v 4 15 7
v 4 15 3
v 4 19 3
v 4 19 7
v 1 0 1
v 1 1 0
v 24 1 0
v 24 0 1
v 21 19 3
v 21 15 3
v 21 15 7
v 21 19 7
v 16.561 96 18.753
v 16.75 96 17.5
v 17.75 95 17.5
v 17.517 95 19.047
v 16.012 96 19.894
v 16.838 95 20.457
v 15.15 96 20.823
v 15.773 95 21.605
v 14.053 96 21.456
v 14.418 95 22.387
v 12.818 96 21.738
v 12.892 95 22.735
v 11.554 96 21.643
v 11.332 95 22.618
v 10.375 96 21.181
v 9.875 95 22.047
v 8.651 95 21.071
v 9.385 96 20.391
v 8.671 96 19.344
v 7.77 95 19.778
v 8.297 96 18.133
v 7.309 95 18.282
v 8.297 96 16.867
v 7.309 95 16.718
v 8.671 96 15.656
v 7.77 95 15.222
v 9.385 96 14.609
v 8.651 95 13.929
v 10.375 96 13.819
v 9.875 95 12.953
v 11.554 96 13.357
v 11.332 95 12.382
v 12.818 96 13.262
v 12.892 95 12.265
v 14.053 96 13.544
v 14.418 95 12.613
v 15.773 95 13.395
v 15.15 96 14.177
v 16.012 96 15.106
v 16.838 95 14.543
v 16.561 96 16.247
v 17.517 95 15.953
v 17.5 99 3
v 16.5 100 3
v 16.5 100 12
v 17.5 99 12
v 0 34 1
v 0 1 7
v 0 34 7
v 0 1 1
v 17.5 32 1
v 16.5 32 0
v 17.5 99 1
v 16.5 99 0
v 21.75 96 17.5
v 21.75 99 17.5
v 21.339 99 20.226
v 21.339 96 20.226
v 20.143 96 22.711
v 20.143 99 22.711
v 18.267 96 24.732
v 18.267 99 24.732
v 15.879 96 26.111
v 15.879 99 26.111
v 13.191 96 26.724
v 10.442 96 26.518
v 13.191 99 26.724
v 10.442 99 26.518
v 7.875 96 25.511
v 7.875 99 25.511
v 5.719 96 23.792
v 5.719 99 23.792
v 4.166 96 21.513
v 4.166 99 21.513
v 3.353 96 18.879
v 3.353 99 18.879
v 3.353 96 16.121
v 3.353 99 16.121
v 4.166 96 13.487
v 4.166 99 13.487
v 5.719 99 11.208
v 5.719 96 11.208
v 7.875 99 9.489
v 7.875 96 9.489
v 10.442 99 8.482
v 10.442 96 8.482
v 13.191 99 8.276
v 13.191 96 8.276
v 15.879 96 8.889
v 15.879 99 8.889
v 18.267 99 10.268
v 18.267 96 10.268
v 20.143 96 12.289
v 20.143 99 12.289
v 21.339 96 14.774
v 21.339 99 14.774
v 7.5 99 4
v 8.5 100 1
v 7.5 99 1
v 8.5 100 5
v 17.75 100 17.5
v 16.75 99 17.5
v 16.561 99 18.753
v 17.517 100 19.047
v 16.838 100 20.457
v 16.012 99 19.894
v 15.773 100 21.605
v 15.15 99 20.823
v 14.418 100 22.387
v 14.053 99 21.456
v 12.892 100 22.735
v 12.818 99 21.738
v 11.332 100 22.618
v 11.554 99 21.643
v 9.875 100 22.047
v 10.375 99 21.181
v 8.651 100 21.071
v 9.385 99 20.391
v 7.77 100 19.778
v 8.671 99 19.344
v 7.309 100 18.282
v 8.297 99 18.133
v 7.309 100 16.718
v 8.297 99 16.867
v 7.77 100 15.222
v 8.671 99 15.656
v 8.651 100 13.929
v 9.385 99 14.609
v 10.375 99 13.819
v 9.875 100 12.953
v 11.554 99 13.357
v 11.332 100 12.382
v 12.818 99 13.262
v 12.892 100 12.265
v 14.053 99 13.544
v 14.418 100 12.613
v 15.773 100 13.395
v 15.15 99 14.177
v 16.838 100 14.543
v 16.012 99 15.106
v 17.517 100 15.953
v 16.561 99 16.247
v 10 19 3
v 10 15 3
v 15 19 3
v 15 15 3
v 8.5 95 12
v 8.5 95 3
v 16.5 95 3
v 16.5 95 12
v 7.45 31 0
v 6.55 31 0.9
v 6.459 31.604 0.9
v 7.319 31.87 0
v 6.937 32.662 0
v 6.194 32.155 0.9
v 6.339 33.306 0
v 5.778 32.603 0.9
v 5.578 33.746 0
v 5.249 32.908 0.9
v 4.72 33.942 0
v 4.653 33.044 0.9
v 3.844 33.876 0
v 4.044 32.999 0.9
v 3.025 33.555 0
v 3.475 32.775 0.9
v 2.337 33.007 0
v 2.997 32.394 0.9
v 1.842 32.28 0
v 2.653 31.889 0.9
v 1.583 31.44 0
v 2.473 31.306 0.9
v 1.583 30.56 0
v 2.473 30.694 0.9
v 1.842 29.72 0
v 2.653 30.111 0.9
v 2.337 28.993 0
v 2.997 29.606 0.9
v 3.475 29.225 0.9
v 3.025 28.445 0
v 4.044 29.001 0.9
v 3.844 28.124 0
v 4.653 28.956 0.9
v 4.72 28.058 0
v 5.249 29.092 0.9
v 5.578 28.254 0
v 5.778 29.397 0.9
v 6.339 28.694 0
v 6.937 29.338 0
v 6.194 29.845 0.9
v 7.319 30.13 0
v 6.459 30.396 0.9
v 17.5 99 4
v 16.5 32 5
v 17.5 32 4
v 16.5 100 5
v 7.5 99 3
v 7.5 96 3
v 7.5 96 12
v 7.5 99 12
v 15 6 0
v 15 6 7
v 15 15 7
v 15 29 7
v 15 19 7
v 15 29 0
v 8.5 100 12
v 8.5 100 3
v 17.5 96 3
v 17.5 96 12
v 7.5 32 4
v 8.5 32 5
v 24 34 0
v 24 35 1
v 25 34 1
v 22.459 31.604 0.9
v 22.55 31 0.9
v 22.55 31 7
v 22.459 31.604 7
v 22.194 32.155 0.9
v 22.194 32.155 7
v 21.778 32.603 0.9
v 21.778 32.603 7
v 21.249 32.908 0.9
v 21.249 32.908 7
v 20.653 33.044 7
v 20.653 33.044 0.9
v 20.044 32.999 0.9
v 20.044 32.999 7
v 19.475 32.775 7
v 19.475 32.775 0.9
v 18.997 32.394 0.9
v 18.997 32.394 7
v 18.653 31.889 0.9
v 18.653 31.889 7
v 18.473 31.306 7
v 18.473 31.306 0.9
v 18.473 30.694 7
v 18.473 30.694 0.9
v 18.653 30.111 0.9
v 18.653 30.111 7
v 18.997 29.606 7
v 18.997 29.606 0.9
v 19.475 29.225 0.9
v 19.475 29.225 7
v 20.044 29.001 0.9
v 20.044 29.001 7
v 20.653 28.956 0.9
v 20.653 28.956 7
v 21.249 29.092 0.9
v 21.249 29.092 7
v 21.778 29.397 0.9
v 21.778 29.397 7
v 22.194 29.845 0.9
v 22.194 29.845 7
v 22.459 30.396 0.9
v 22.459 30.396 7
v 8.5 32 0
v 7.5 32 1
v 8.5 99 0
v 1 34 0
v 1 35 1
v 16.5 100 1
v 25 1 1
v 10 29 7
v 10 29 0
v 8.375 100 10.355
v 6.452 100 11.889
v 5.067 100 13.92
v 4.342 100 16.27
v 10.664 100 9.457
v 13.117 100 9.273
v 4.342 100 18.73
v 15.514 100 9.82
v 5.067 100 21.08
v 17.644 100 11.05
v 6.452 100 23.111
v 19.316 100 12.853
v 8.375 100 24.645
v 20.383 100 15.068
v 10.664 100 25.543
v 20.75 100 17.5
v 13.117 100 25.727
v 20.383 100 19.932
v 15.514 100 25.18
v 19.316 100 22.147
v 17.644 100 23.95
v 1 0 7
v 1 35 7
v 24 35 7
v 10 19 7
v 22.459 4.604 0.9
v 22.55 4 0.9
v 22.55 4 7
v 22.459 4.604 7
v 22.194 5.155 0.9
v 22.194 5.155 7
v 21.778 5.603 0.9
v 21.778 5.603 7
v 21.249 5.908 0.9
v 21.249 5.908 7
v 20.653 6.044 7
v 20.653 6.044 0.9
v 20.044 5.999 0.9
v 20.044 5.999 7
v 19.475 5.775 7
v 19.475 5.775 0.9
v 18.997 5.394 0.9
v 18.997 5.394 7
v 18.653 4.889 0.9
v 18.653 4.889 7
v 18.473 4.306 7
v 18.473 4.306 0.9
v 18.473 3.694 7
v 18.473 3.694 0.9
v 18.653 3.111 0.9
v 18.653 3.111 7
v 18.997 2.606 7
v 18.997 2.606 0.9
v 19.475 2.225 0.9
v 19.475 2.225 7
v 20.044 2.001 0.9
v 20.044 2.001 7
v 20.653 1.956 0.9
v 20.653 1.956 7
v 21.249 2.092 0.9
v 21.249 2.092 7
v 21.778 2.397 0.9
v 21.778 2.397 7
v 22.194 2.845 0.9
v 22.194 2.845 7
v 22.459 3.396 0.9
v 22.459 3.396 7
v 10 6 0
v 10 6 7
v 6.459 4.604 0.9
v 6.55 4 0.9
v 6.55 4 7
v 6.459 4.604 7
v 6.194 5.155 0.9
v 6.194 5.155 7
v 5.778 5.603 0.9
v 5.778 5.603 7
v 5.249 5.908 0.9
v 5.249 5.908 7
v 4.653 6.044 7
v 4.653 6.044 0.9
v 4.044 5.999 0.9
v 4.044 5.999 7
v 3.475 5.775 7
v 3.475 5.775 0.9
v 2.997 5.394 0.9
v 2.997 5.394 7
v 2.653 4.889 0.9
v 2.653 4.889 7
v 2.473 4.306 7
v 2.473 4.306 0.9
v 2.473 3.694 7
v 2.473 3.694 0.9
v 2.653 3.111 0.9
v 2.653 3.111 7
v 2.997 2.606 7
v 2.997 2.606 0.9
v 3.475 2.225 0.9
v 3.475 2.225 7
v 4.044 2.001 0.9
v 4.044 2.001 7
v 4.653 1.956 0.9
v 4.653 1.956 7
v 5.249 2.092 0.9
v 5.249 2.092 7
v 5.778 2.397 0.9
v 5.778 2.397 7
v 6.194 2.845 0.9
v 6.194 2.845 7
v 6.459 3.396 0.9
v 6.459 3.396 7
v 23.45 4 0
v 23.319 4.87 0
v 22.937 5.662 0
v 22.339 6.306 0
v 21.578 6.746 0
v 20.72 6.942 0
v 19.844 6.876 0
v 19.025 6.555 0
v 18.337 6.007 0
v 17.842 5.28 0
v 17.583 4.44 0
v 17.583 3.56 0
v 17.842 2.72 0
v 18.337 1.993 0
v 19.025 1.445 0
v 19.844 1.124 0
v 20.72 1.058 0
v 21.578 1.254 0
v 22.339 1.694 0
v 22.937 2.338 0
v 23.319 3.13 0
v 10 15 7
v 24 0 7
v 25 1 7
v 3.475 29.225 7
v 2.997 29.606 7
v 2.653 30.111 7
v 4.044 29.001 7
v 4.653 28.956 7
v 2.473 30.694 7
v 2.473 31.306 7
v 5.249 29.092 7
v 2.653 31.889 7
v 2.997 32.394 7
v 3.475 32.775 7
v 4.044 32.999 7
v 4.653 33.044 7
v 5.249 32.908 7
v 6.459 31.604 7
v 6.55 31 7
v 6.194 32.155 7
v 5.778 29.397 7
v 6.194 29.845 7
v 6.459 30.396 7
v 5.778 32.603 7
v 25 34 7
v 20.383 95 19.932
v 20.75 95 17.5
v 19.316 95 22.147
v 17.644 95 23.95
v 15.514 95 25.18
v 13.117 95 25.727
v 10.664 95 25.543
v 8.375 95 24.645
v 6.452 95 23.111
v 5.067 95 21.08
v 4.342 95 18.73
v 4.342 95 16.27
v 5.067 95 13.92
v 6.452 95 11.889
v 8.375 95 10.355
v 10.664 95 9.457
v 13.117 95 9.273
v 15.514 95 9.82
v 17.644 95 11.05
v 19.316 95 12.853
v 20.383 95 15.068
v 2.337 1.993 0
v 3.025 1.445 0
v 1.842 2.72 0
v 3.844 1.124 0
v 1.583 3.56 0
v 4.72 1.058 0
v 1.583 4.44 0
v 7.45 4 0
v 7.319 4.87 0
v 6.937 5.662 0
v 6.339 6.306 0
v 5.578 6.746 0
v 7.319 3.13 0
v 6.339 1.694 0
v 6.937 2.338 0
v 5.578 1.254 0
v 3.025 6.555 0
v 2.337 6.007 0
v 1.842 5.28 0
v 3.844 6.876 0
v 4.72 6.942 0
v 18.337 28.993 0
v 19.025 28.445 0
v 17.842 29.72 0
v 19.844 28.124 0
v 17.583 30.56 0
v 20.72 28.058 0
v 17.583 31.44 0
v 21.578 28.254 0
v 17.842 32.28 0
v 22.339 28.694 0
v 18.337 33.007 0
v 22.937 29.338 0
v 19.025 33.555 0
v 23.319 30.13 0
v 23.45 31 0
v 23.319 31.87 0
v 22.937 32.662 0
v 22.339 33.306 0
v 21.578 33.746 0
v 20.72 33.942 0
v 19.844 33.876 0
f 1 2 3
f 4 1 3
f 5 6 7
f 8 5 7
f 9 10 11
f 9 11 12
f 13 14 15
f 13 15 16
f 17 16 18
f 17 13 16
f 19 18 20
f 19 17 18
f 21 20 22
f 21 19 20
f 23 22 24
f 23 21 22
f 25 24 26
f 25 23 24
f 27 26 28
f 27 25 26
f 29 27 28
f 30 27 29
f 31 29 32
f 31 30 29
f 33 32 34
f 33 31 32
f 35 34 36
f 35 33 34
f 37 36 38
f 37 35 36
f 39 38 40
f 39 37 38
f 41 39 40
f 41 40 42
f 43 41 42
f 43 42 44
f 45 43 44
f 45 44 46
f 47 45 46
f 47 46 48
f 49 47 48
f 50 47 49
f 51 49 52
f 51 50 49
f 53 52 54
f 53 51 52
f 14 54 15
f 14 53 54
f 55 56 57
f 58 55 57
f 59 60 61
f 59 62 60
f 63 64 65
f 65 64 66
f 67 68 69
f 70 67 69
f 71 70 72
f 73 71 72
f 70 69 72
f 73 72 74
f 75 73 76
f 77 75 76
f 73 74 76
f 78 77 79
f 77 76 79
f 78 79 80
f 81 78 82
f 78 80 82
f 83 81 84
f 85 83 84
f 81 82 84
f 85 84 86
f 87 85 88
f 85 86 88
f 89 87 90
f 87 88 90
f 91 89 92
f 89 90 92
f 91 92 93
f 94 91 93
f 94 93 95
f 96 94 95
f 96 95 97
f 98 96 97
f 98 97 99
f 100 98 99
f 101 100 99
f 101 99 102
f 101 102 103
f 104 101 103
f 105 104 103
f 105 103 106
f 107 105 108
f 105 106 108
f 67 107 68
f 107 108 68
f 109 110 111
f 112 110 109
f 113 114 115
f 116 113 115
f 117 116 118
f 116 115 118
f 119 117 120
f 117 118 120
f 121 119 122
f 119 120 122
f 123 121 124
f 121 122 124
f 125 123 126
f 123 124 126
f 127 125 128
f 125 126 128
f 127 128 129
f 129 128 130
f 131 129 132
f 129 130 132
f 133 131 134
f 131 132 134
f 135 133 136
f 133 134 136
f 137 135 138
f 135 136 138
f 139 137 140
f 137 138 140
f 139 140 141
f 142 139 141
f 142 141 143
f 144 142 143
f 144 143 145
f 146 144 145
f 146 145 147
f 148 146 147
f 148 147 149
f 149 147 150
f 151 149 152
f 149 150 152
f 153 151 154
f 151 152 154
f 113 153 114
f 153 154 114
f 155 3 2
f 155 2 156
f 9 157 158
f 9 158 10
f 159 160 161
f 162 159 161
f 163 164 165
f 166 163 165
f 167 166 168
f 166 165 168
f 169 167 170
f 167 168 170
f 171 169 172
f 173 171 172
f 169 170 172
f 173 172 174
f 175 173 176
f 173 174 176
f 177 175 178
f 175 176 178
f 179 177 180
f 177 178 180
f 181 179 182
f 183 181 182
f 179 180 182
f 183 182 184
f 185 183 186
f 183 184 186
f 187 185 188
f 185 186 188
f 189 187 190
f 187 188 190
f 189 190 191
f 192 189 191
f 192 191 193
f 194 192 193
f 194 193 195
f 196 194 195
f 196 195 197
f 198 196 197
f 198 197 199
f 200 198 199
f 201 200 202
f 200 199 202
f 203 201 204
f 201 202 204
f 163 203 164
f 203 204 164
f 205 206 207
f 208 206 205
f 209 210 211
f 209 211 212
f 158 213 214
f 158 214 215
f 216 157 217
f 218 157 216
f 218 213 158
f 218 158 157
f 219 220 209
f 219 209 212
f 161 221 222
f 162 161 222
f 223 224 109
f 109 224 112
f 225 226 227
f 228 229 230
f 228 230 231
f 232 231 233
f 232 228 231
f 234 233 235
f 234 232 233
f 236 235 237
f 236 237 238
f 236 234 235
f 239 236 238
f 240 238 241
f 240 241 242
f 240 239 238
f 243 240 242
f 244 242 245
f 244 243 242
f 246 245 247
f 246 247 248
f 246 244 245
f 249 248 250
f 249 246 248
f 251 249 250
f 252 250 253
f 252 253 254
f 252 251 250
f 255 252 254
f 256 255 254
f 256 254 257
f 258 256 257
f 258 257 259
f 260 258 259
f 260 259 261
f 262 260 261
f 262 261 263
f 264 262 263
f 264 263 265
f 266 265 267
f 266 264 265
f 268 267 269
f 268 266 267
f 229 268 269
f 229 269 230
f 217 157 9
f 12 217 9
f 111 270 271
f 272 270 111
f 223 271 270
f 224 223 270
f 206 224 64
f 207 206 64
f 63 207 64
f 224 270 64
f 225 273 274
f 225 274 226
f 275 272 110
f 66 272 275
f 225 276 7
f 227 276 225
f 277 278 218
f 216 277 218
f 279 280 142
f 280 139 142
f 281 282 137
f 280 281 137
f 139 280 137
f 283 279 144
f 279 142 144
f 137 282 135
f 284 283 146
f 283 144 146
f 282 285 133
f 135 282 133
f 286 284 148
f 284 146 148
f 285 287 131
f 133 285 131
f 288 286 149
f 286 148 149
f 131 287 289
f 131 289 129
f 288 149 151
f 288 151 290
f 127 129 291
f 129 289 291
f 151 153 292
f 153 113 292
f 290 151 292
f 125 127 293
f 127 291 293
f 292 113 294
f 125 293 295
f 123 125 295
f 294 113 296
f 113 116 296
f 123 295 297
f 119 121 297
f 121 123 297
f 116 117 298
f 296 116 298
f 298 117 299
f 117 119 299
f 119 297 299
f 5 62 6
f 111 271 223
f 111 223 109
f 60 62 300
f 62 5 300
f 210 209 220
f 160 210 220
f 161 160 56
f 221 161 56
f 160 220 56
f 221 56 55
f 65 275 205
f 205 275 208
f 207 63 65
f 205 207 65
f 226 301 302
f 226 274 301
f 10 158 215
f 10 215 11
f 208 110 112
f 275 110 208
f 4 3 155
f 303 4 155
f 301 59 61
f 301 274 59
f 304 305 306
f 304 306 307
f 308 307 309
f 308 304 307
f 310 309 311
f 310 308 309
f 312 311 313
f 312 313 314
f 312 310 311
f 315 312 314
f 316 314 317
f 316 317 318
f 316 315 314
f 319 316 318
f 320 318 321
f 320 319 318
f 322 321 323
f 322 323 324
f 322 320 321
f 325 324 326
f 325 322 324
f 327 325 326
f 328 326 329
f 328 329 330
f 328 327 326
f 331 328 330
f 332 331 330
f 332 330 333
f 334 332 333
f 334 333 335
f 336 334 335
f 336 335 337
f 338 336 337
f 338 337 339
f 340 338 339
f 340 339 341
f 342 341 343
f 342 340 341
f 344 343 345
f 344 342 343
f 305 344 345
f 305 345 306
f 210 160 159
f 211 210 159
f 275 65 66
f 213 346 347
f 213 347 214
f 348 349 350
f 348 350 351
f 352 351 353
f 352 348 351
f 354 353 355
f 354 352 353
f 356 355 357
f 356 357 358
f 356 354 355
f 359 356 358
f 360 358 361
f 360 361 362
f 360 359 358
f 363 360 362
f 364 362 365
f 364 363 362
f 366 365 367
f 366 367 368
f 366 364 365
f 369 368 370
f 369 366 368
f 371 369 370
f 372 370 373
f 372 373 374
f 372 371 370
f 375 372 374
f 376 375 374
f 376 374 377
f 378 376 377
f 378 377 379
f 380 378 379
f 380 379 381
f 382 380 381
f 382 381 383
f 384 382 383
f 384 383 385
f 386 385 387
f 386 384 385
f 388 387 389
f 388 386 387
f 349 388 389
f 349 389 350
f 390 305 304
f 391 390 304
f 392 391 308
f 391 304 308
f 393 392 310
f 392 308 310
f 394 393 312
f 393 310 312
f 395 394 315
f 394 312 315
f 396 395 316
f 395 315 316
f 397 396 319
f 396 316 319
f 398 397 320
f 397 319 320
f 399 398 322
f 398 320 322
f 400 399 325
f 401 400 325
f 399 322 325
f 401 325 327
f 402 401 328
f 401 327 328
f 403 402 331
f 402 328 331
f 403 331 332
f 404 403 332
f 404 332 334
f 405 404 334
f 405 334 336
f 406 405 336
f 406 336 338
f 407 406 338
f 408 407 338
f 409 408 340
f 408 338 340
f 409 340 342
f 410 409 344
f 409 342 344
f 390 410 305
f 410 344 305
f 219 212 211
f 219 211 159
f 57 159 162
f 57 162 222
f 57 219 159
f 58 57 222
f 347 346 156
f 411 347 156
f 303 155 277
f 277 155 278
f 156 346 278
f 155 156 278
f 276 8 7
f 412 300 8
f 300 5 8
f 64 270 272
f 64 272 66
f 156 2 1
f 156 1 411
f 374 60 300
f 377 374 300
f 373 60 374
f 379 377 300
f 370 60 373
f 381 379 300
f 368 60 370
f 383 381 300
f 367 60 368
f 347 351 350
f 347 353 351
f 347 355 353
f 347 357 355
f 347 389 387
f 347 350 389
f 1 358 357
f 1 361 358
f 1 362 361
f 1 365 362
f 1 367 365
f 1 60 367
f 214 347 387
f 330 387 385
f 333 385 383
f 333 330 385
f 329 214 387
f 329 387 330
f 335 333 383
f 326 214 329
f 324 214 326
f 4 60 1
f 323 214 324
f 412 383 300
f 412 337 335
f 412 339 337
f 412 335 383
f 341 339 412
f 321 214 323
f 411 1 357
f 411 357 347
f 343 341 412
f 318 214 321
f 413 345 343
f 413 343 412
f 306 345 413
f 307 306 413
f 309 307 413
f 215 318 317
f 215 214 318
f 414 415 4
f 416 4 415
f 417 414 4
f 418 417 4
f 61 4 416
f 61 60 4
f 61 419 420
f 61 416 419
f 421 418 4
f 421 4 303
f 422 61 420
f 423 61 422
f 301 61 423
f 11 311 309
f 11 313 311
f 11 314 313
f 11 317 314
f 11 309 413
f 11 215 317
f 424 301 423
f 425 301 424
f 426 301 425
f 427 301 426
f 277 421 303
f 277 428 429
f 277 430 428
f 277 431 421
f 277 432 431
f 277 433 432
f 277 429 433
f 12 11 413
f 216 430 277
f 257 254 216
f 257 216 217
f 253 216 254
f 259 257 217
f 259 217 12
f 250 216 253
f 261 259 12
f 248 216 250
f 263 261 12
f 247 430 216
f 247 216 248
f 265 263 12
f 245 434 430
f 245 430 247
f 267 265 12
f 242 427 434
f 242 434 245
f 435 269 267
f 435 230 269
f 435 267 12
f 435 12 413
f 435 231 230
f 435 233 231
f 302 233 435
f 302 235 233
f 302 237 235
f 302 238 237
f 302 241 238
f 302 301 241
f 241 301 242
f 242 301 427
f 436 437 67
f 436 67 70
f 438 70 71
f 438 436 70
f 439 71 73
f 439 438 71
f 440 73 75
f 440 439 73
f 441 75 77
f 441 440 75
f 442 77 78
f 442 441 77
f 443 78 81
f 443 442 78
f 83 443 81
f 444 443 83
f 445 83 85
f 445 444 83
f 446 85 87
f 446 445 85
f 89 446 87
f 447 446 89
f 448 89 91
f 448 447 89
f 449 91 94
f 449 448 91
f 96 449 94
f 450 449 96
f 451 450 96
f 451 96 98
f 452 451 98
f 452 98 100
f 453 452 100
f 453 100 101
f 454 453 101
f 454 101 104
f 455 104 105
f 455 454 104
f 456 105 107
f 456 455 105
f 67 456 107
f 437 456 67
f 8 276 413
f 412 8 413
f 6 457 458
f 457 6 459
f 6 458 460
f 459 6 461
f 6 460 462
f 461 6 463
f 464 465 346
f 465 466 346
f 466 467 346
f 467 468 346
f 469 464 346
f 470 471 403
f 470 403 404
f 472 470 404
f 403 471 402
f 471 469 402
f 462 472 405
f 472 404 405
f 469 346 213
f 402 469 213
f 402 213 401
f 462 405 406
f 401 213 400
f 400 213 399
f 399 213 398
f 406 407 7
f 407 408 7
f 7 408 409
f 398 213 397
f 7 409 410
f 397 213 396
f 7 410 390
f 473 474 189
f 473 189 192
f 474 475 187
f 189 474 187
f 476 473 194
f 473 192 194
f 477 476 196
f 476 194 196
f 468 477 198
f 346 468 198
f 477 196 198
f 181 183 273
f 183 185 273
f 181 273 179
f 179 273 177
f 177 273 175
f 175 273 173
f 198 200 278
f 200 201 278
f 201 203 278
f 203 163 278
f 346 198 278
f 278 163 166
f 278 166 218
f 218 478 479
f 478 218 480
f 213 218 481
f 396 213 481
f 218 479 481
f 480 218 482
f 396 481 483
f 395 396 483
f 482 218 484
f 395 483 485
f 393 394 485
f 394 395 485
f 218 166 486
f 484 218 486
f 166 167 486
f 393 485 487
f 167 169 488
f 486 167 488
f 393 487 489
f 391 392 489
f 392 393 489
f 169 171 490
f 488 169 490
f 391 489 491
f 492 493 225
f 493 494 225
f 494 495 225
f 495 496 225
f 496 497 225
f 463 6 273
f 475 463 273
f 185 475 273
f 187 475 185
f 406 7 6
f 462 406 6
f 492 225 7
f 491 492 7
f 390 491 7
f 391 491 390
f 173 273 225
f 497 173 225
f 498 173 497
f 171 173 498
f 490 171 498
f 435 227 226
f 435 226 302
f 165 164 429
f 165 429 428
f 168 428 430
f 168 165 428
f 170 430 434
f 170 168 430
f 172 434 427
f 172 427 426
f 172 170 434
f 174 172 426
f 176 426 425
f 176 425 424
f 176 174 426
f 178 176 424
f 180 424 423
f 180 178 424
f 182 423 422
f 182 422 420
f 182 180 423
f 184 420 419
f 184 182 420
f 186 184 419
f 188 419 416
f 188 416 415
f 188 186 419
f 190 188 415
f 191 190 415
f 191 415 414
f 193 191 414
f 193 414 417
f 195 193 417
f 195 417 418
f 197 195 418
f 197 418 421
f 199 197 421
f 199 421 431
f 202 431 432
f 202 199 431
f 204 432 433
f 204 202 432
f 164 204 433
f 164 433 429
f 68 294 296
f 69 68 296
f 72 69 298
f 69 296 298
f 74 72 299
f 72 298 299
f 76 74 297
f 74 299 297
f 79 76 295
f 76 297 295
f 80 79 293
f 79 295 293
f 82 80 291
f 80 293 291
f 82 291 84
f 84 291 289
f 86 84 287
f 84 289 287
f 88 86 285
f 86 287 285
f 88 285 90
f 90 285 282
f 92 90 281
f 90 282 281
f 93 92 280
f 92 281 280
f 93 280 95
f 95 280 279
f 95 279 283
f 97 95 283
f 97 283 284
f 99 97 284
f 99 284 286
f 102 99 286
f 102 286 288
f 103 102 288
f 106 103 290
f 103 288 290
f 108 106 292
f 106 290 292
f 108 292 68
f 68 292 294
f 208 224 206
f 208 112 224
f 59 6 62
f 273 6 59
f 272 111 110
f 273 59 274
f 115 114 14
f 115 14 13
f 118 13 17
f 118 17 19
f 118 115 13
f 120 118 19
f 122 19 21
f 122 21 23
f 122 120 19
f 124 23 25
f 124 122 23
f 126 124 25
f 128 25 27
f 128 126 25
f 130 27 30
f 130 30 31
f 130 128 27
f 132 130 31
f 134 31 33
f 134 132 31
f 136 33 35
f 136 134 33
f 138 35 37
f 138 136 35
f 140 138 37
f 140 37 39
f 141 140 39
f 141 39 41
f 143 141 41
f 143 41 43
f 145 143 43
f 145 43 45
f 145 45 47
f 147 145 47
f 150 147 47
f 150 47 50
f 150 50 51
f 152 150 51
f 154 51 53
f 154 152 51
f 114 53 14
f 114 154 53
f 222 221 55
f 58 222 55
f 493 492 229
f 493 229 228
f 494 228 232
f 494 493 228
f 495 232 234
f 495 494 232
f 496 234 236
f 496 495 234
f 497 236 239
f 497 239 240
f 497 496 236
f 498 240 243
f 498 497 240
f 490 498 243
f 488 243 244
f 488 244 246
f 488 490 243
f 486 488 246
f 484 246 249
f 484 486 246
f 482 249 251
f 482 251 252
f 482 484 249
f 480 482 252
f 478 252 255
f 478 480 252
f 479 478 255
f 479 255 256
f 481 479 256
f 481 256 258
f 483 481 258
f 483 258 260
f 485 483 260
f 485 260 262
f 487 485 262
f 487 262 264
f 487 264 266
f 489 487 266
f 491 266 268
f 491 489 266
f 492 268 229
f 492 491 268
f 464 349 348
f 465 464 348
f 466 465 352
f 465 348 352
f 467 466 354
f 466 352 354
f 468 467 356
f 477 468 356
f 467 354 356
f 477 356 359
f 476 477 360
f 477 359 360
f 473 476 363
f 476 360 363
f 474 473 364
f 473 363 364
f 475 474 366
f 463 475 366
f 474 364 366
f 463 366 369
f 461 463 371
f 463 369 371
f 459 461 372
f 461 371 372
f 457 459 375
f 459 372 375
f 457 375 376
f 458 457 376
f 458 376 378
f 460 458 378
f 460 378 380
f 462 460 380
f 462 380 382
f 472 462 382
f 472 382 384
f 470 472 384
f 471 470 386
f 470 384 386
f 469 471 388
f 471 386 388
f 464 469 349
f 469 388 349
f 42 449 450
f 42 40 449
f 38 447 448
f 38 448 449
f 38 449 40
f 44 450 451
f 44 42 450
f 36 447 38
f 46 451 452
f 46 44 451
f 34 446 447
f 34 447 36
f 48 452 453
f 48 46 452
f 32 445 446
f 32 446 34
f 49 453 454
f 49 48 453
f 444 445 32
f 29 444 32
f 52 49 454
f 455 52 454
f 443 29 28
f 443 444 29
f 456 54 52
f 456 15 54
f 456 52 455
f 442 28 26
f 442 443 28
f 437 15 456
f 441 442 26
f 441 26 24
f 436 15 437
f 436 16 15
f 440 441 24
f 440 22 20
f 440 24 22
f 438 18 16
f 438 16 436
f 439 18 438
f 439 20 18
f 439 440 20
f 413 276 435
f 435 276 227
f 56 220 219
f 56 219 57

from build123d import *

# Parameters (mm, degrees)
CYLINDER004_R          = 4.25
CYLINDER004_DEPTH      = 5
CYLINDER004_ROLL_ANGLE = 90
CYLINDER005_R          = 9.25
CYLINDER005_DEPTH      = 5
CYLINDER005_ROLL_ANGLE = 90
CHAMFER_SIZE           = 1
BOX003_W               = 10
BOX003_H               = 5
BOX003_DEPTH           = 9
CHAMFER001_SIZE        = 1
BOX001_W               = 10
BOX001_H               = 68
BOX001_DEPTH           = 5
CHAMFER002_SIZE        = 1
BOX004_W               = 17
BOX004_H               = 4
BOX004_DEPTH           = 4
CYLINDER003_R          = 2.05
CYLINDER003_DEPTH      = 7
CYLINDER002_R          = 2.05
CYLINDER002_DEPTH      = 7
CYLINDER001_R          = 2.05
CYLINDER001_DEPTH      = 7
CYLINDER_R             = 2.05
CYLINDER_DEPTH         = 7
BOX002_W               = 5
BOX002_H               = 23
BOX002_DEPTH           = 7
BOX_W                  = 25
BOX_H                  = 35
BOX_DEPTH              = 7
CHAMFER003_SIZE        = 1
CHAMFER004_SIZE        = 0.9
CHAMFER005_SIZE        = 0.9


with BuildPart() as cylinder:
    # Cylinder004 → Cylinder004 (new body)
    with BuildSketch(Plane.XY):
        Circle(CYLINDER004_R)
    extrude(amount=CYLINDER004_DEPTH)


with BuildPart() as cylinder_1:
    # Cylinder004 roll: moved
    add(cylinder.part.rotate(Axis((0, 0, 0), (1, 0, 0)), CYLINDER004_ROLL_ANGLE))


with BuildPart() as cylinder_2:
    # Cylinder004 placement: moved
    add(cylinder_1.part.moved(Location((12.5, 100, 17.5))))


with BuildPart() as chamfer_body:
    # Cylinder005 → Cylinder005 (new body)
    with BuildSketch(Plane.XY):
        Circle(CYLINDER005_R)
    extrude(amount=CYLINDER005_DEPTH)


with BuildPart() as chamfer_body_1:
    # Cylinder005 roll: moved
    add(chamfer_body.part.rotate(Axis((0, 0, 0), (1, 0, 0)), CYLINDER005_ROLL_ANGLE))


with BuildPart() as chamfer_body_2:
    # Cylinder005 placement: moved
    add(chamfer_body_1.part.moved(Location((12.5, 100, 17.5))))

    # Cut005: cut Cylinder
    add(cylinder_2.part, mode=Mode.SUBTRACT)

    # Chamfer
    chamfer_edges = [chamfer_body_2.edges().sort_by_distance(p)[0] for p in [
        (3.25, 95, 17.5),
        (3.25, 100, 17.5),
        (8.25, 95, 17.5),
        (8.25, 100, 17.5),
    ]]
    chamfer(chamfer_edges, length=CHAMFER_SIZE)


with BuildPart() as chamfer001:
    # Box003 → Box003 (new body)
    with BuildSketch(Plane(origin=(7.5, 95, 3), x_dir=(1, 0, 0), z_dir=(0, 0, 1))):
        with Locations((5, 2.5)):
            Rectangle(BOX003_W, BOX003_H)
    extrude(amount=BOX003_DEPTH)

    # Chamfer001
    chamfer001_edges = [chamfer001.edges().sort_by_distance(p)[0] for p in [
        (7.5, 95, 7.5),
        (7.5, 100, 7.5),
        (17.5, 95, 7.5),
        (17.5, 100, 7.5),
    ]]
    chamfer(chamfer001_edges, length=CHAMFER001_SIZE)


with BuildPart() as chamfer002:
    # Box001 → Box001 (new body)
    with BuildSketch(Plane(origin=(7.5, 32, 0), x_dir=(1, 0, 0), z_dir=(0, 0, 1))):
        with Locations((5, 34)):
            Rectangle(BOX001_W, BOX001_H)
    extrude(amount=BOX001_DEPTH)

    # Chamfer002
    chamfer002_edges = [chamfer002.edges().sort_by_distance(p)[0] for p in [
        (7.5, 66, 5),
        (7.5, 100, 2.5),
        (7.5, 66, 0),
        (17.5, 66, 5),
        (17.5, 100, 2.5),
        (17.5, 66, 0),
        (12.5, 100, 0),
    ]]
    chamfer(chamfer002_edges, length=CHAMFER002_SIZE)


with BuildPart() as cube004:
    # Box004 → Box004 (new body)
    with BuildSketch(Plane(origin=(4, 15, 3), x_dir=(1, 0, 0), z_dir=(0, 0, 1))):
        with Locations((8.5, 2)):
            Rectangle(BOX004_W, BOX004_H)
    extrude(amount=BOX004_DEPTH)


with BuildPart() as cylinder003:
    # Cylinder003 → Cylinder003 (new body)
    with BuildSketch(Plane(origin=(20.5, 4, 0), x_dir=(1, 0, 0), z_dir=(0, 0, 1))):
        Circle(CYLINDER003_R)
    extrude(amount=CYLINDER003_DEPTH)


with BuildPart() as cylinder002:
    # Cylinder002 → Cylinder002 (new body)
    with BuildSketch(Plane(origin=(20.5, 31, 0), x_dir=(1, 0, 0), z_dir=(0, 0, 1))):
        Circle(CYLINDER002_R)
    extrude(amount=CYLINDER002_DEPTH)


with BuildPart() as cylinder001:
    # Cylinder001 → Cylinder001 (new body)
    with BuildSketch(Plane(origin=(4.5, 31, 0), x_dir=(1, 0, 0), z_dir=(0, 0, 1))):
        Circle(CYLINDER001_R)
    extrude(amount=CYLINDER001_DEPTH)


with BuildPart() as cylinder000:
    # Cylinder → Cylinder (new body)
    with BuildSketch(Plane(origin=(4.5, 4, 0), x_dir=(1, 0, 0), z_dir=(0, 0, 1))):
        Circle(CYLINDER_R)
    extrude(amount=CYLINDER_DEPTH)


with BuildPart() as cube002:
    # Box002 → Box002 (new body)
    with BuildSketch(Plane(origin=(10, 6, 0), x_dir=(1, 0, 0), z_dir=(0, 0, 1))):
        with Locations((2.5, 11.5)):
            Rectangle(BOX002_W, BOX002_H)
    extrude(amount=BOX002_DEPTH)


with BuildPart() as chamfer005:
    # Box → Box (new body)
    with BuildSketch(Plane.XY):
        with Locations((12.5, 17.5)):
            Rectangle(BOX_W, BOX_H)
    extrude(amount=BOX_DEPTH)

    # Cut: cut Cube002
    add(cube002.part, mode=Mode.SUBTRACT)

    # Cut001: cut Cylinder000
    add(cylinder000.part, mode=Mode.SUBTRACT)

    # Cut002: cut Cylinder001
    add(cylinder001.part, mode=Mode.SUBTRACT)

    # Cut003: cut Cylinder002
    add(cylinder002.part, mode=Mode.SUBTRACT)

    # Cut004: cut Cylinder003
    add(cylinder003.part, mode=Mode.SUBTRACT)

    # Chamfer003
    chamfer003_edges = [chamfer005.edges().sort_by_distance(p)[0] for p in [
        (0, 0, 3.5),
        (0, 35, 3.5),
        (0, 17.5, 0),
        (12.5, 0, 0),
        (25, 0, 3.5),
        (12.5, 35, 0),
        (25, 35, 3.5),
        (25, 17.5, 0),
    ]]
    chamfer(chamfer003_edges, length=CHAMFER003_SIZE)

    # Cut006: cut Cube004
    add(cube004.part, mode=Mode.SUBTRACT)

    # Chamfer004
    chamfer004_edges = [chamfer005.edges().sort_by_distance(p)[0] for p in [
        (18.45, 31, 0),
    ]]
    chamfer(chamfer004_edges, length=CHAMFER004_SIZE)

    # Chamfer005
    chamfer005_edges = [chamfer005.edges().sort_by_distance(p)[0] for p in [
        (2.45, 4, 0),
        (2.45, 31, 0),
        (18.45, 4, 0),
    ]]
    chamfer(chamfer005_edges, length=CHAMFER005_SIZE)


solid = Compound([chamfer_body_2.part, chamfer001.part, chamfer002.part, chamfer005.part])
